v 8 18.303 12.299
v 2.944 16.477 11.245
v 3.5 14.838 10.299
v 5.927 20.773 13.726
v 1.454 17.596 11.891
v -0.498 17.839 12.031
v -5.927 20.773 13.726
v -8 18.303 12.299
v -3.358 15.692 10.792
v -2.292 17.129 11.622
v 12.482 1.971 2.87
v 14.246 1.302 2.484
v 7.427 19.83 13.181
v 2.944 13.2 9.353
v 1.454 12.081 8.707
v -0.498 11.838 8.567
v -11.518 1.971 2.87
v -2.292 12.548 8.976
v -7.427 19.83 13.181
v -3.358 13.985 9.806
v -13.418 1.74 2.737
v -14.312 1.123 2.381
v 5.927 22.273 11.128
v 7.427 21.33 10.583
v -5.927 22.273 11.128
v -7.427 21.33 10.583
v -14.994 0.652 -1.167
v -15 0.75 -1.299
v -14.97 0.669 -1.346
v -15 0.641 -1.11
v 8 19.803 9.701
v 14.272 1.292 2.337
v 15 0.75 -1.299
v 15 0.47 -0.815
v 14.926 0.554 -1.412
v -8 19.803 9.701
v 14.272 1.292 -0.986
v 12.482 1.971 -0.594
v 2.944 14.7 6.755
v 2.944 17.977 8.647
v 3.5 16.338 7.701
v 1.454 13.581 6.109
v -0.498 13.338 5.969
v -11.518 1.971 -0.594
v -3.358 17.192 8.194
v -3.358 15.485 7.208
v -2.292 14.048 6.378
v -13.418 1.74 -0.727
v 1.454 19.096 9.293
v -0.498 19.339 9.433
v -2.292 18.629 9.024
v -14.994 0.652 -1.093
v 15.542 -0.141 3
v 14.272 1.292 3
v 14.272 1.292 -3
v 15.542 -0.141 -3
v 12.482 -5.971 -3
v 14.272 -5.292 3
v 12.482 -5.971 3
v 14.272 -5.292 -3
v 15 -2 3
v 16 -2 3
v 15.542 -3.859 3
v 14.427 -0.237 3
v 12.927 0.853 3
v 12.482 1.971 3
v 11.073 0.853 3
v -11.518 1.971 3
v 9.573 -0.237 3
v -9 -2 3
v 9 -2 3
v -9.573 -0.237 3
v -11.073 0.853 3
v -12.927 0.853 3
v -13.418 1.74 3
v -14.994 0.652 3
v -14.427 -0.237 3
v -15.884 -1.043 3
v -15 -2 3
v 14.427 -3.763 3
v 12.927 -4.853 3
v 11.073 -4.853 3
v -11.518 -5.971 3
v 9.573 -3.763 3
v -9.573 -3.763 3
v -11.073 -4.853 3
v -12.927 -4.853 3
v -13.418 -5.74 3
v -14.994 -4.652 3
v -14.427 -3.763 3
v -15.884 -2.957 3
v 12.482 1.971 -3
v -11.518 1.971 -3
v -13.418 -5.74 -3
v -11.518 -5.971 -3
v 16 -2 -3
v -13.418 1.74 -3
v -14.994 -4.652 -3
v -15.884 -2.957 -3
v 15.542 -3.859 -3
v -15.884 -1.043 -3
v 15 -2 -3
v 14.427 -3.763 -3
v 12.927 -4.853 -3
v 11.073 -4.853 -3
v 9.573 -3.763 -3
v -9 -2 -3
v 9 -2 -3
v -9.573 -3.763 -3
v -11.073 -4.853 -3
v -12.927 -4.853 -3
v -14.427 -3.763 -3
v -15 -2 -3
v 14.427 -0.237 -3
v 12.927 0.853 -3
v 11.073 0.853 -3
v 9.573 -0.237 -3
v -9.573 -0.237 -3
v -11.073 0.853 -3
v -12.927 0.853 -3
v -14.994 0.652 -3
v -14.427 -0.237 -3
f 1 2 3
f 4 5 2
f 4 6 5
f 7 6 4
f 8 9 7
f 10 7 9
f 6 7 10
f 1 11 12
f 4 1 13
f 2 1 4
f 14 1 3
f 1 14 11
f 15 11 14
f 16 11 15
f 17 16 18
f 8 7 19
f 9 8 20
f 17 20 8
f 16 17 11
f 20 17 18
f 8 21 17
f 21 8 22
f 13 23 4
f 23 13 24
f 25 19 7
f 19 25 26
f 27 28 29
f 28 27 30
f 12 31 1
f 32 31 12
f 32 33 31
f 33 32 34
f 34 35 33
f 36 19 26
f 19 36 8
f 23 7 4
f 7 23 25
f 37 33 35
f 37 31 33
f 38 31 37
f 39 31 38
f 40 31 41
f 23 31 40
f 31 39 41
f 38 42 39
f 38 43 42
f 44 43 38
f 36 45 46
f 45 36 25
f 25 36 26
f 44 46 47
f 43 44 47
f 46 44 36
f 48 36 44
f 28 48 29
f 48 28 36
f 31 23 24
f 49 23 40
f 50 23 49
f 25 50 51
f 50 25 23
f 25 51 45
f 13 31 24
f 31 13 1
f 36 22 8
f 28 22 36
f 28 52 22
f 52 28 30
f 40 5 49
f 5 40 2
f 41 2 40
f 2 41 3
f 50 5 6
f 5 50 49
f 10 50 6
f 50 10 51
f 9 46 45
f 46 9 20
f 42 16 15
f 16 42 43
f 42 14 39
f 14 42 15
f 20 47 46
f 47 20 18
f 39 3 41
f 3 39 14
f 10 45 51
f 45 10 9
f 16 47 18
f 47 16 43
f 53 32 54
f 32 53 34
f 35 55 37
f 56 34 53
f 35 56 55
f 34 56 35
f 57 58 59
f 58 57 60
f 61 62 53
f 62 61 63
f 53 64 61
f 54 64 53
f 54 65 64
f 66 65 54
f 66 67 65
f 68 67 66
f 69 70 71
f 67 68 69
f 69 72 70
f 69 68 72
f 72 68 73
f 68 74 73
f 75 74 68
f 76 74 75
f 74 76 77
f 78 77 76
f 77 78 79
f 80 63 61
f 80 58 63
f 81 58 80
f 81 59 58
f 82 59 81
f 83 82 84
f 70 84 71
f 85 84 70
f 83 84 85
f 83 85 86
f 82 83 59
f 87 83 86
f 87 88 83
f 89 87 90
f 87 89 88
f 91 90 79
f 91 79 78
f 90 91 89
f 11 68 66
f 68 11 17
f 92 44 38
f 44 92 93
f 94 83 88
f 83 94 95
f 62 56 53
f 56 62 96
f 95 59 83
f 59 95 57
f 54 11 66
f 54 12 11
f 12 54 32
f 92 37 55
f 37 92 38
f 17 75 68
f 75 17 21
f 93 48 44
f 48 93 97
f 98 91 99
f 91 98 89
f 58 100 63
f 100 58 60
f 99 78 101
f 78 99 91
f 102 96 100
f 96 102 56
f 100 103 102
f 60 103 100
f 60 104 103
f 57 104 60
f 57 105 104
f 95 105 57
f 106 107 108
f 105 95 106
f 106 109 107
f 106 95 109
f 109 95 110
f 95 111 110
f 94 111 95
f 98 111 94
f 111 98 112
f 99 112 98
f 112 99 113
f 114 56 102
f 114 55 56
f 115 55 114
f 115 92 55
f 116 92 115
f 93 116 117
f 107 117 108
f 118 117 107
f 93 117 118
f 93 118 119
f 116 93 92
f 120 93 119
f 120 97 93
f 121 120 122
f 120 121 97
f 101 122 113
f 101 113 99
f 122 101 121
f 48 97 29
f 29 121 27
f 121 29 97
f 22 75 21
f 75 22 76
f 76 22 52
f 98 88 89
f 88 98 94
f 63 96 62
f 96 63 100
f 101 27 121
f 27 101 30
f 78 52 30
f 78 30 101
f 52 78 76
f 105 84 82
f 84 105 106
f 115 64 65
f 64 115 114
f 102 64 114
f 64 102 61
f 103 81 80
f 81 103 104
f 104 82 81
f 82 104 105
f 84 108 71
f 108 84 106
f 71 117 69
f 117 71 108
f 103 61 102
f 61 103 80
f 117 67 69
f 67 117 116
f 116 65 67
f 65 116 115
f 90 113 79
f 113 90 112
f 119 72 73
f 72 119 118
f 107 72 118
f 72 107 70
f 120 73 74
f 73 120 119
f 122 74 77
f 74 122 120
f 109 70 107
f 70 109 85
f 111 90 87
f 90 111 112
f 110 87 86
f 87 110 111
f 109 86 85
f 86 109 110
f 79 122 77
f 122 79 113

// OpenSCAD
module ovale(h,r,l){
hull(){
translate([l,0,0])cylinder(h, r, r, true);
translate([-l,0,0])cylinder(h,r, r, true);
}   
}

difference(){
union(){
translate([0,-2,0])ovale(6,4,12);

rotate(30,[1,0,0]) 
    difference(){
        hull(){
            ovale(3,3,12);
            translate([0,22,0])ovale(3,3,5);
        }
        translate([0,18,0])cylinder(15, 3.5, 3.5, true);
}
}
union(){
translate([12,-2,0])cylinder(10, 3, 3, true);
translate([-12,-2,0])cylinder(10,3, 3, true);
}
}
